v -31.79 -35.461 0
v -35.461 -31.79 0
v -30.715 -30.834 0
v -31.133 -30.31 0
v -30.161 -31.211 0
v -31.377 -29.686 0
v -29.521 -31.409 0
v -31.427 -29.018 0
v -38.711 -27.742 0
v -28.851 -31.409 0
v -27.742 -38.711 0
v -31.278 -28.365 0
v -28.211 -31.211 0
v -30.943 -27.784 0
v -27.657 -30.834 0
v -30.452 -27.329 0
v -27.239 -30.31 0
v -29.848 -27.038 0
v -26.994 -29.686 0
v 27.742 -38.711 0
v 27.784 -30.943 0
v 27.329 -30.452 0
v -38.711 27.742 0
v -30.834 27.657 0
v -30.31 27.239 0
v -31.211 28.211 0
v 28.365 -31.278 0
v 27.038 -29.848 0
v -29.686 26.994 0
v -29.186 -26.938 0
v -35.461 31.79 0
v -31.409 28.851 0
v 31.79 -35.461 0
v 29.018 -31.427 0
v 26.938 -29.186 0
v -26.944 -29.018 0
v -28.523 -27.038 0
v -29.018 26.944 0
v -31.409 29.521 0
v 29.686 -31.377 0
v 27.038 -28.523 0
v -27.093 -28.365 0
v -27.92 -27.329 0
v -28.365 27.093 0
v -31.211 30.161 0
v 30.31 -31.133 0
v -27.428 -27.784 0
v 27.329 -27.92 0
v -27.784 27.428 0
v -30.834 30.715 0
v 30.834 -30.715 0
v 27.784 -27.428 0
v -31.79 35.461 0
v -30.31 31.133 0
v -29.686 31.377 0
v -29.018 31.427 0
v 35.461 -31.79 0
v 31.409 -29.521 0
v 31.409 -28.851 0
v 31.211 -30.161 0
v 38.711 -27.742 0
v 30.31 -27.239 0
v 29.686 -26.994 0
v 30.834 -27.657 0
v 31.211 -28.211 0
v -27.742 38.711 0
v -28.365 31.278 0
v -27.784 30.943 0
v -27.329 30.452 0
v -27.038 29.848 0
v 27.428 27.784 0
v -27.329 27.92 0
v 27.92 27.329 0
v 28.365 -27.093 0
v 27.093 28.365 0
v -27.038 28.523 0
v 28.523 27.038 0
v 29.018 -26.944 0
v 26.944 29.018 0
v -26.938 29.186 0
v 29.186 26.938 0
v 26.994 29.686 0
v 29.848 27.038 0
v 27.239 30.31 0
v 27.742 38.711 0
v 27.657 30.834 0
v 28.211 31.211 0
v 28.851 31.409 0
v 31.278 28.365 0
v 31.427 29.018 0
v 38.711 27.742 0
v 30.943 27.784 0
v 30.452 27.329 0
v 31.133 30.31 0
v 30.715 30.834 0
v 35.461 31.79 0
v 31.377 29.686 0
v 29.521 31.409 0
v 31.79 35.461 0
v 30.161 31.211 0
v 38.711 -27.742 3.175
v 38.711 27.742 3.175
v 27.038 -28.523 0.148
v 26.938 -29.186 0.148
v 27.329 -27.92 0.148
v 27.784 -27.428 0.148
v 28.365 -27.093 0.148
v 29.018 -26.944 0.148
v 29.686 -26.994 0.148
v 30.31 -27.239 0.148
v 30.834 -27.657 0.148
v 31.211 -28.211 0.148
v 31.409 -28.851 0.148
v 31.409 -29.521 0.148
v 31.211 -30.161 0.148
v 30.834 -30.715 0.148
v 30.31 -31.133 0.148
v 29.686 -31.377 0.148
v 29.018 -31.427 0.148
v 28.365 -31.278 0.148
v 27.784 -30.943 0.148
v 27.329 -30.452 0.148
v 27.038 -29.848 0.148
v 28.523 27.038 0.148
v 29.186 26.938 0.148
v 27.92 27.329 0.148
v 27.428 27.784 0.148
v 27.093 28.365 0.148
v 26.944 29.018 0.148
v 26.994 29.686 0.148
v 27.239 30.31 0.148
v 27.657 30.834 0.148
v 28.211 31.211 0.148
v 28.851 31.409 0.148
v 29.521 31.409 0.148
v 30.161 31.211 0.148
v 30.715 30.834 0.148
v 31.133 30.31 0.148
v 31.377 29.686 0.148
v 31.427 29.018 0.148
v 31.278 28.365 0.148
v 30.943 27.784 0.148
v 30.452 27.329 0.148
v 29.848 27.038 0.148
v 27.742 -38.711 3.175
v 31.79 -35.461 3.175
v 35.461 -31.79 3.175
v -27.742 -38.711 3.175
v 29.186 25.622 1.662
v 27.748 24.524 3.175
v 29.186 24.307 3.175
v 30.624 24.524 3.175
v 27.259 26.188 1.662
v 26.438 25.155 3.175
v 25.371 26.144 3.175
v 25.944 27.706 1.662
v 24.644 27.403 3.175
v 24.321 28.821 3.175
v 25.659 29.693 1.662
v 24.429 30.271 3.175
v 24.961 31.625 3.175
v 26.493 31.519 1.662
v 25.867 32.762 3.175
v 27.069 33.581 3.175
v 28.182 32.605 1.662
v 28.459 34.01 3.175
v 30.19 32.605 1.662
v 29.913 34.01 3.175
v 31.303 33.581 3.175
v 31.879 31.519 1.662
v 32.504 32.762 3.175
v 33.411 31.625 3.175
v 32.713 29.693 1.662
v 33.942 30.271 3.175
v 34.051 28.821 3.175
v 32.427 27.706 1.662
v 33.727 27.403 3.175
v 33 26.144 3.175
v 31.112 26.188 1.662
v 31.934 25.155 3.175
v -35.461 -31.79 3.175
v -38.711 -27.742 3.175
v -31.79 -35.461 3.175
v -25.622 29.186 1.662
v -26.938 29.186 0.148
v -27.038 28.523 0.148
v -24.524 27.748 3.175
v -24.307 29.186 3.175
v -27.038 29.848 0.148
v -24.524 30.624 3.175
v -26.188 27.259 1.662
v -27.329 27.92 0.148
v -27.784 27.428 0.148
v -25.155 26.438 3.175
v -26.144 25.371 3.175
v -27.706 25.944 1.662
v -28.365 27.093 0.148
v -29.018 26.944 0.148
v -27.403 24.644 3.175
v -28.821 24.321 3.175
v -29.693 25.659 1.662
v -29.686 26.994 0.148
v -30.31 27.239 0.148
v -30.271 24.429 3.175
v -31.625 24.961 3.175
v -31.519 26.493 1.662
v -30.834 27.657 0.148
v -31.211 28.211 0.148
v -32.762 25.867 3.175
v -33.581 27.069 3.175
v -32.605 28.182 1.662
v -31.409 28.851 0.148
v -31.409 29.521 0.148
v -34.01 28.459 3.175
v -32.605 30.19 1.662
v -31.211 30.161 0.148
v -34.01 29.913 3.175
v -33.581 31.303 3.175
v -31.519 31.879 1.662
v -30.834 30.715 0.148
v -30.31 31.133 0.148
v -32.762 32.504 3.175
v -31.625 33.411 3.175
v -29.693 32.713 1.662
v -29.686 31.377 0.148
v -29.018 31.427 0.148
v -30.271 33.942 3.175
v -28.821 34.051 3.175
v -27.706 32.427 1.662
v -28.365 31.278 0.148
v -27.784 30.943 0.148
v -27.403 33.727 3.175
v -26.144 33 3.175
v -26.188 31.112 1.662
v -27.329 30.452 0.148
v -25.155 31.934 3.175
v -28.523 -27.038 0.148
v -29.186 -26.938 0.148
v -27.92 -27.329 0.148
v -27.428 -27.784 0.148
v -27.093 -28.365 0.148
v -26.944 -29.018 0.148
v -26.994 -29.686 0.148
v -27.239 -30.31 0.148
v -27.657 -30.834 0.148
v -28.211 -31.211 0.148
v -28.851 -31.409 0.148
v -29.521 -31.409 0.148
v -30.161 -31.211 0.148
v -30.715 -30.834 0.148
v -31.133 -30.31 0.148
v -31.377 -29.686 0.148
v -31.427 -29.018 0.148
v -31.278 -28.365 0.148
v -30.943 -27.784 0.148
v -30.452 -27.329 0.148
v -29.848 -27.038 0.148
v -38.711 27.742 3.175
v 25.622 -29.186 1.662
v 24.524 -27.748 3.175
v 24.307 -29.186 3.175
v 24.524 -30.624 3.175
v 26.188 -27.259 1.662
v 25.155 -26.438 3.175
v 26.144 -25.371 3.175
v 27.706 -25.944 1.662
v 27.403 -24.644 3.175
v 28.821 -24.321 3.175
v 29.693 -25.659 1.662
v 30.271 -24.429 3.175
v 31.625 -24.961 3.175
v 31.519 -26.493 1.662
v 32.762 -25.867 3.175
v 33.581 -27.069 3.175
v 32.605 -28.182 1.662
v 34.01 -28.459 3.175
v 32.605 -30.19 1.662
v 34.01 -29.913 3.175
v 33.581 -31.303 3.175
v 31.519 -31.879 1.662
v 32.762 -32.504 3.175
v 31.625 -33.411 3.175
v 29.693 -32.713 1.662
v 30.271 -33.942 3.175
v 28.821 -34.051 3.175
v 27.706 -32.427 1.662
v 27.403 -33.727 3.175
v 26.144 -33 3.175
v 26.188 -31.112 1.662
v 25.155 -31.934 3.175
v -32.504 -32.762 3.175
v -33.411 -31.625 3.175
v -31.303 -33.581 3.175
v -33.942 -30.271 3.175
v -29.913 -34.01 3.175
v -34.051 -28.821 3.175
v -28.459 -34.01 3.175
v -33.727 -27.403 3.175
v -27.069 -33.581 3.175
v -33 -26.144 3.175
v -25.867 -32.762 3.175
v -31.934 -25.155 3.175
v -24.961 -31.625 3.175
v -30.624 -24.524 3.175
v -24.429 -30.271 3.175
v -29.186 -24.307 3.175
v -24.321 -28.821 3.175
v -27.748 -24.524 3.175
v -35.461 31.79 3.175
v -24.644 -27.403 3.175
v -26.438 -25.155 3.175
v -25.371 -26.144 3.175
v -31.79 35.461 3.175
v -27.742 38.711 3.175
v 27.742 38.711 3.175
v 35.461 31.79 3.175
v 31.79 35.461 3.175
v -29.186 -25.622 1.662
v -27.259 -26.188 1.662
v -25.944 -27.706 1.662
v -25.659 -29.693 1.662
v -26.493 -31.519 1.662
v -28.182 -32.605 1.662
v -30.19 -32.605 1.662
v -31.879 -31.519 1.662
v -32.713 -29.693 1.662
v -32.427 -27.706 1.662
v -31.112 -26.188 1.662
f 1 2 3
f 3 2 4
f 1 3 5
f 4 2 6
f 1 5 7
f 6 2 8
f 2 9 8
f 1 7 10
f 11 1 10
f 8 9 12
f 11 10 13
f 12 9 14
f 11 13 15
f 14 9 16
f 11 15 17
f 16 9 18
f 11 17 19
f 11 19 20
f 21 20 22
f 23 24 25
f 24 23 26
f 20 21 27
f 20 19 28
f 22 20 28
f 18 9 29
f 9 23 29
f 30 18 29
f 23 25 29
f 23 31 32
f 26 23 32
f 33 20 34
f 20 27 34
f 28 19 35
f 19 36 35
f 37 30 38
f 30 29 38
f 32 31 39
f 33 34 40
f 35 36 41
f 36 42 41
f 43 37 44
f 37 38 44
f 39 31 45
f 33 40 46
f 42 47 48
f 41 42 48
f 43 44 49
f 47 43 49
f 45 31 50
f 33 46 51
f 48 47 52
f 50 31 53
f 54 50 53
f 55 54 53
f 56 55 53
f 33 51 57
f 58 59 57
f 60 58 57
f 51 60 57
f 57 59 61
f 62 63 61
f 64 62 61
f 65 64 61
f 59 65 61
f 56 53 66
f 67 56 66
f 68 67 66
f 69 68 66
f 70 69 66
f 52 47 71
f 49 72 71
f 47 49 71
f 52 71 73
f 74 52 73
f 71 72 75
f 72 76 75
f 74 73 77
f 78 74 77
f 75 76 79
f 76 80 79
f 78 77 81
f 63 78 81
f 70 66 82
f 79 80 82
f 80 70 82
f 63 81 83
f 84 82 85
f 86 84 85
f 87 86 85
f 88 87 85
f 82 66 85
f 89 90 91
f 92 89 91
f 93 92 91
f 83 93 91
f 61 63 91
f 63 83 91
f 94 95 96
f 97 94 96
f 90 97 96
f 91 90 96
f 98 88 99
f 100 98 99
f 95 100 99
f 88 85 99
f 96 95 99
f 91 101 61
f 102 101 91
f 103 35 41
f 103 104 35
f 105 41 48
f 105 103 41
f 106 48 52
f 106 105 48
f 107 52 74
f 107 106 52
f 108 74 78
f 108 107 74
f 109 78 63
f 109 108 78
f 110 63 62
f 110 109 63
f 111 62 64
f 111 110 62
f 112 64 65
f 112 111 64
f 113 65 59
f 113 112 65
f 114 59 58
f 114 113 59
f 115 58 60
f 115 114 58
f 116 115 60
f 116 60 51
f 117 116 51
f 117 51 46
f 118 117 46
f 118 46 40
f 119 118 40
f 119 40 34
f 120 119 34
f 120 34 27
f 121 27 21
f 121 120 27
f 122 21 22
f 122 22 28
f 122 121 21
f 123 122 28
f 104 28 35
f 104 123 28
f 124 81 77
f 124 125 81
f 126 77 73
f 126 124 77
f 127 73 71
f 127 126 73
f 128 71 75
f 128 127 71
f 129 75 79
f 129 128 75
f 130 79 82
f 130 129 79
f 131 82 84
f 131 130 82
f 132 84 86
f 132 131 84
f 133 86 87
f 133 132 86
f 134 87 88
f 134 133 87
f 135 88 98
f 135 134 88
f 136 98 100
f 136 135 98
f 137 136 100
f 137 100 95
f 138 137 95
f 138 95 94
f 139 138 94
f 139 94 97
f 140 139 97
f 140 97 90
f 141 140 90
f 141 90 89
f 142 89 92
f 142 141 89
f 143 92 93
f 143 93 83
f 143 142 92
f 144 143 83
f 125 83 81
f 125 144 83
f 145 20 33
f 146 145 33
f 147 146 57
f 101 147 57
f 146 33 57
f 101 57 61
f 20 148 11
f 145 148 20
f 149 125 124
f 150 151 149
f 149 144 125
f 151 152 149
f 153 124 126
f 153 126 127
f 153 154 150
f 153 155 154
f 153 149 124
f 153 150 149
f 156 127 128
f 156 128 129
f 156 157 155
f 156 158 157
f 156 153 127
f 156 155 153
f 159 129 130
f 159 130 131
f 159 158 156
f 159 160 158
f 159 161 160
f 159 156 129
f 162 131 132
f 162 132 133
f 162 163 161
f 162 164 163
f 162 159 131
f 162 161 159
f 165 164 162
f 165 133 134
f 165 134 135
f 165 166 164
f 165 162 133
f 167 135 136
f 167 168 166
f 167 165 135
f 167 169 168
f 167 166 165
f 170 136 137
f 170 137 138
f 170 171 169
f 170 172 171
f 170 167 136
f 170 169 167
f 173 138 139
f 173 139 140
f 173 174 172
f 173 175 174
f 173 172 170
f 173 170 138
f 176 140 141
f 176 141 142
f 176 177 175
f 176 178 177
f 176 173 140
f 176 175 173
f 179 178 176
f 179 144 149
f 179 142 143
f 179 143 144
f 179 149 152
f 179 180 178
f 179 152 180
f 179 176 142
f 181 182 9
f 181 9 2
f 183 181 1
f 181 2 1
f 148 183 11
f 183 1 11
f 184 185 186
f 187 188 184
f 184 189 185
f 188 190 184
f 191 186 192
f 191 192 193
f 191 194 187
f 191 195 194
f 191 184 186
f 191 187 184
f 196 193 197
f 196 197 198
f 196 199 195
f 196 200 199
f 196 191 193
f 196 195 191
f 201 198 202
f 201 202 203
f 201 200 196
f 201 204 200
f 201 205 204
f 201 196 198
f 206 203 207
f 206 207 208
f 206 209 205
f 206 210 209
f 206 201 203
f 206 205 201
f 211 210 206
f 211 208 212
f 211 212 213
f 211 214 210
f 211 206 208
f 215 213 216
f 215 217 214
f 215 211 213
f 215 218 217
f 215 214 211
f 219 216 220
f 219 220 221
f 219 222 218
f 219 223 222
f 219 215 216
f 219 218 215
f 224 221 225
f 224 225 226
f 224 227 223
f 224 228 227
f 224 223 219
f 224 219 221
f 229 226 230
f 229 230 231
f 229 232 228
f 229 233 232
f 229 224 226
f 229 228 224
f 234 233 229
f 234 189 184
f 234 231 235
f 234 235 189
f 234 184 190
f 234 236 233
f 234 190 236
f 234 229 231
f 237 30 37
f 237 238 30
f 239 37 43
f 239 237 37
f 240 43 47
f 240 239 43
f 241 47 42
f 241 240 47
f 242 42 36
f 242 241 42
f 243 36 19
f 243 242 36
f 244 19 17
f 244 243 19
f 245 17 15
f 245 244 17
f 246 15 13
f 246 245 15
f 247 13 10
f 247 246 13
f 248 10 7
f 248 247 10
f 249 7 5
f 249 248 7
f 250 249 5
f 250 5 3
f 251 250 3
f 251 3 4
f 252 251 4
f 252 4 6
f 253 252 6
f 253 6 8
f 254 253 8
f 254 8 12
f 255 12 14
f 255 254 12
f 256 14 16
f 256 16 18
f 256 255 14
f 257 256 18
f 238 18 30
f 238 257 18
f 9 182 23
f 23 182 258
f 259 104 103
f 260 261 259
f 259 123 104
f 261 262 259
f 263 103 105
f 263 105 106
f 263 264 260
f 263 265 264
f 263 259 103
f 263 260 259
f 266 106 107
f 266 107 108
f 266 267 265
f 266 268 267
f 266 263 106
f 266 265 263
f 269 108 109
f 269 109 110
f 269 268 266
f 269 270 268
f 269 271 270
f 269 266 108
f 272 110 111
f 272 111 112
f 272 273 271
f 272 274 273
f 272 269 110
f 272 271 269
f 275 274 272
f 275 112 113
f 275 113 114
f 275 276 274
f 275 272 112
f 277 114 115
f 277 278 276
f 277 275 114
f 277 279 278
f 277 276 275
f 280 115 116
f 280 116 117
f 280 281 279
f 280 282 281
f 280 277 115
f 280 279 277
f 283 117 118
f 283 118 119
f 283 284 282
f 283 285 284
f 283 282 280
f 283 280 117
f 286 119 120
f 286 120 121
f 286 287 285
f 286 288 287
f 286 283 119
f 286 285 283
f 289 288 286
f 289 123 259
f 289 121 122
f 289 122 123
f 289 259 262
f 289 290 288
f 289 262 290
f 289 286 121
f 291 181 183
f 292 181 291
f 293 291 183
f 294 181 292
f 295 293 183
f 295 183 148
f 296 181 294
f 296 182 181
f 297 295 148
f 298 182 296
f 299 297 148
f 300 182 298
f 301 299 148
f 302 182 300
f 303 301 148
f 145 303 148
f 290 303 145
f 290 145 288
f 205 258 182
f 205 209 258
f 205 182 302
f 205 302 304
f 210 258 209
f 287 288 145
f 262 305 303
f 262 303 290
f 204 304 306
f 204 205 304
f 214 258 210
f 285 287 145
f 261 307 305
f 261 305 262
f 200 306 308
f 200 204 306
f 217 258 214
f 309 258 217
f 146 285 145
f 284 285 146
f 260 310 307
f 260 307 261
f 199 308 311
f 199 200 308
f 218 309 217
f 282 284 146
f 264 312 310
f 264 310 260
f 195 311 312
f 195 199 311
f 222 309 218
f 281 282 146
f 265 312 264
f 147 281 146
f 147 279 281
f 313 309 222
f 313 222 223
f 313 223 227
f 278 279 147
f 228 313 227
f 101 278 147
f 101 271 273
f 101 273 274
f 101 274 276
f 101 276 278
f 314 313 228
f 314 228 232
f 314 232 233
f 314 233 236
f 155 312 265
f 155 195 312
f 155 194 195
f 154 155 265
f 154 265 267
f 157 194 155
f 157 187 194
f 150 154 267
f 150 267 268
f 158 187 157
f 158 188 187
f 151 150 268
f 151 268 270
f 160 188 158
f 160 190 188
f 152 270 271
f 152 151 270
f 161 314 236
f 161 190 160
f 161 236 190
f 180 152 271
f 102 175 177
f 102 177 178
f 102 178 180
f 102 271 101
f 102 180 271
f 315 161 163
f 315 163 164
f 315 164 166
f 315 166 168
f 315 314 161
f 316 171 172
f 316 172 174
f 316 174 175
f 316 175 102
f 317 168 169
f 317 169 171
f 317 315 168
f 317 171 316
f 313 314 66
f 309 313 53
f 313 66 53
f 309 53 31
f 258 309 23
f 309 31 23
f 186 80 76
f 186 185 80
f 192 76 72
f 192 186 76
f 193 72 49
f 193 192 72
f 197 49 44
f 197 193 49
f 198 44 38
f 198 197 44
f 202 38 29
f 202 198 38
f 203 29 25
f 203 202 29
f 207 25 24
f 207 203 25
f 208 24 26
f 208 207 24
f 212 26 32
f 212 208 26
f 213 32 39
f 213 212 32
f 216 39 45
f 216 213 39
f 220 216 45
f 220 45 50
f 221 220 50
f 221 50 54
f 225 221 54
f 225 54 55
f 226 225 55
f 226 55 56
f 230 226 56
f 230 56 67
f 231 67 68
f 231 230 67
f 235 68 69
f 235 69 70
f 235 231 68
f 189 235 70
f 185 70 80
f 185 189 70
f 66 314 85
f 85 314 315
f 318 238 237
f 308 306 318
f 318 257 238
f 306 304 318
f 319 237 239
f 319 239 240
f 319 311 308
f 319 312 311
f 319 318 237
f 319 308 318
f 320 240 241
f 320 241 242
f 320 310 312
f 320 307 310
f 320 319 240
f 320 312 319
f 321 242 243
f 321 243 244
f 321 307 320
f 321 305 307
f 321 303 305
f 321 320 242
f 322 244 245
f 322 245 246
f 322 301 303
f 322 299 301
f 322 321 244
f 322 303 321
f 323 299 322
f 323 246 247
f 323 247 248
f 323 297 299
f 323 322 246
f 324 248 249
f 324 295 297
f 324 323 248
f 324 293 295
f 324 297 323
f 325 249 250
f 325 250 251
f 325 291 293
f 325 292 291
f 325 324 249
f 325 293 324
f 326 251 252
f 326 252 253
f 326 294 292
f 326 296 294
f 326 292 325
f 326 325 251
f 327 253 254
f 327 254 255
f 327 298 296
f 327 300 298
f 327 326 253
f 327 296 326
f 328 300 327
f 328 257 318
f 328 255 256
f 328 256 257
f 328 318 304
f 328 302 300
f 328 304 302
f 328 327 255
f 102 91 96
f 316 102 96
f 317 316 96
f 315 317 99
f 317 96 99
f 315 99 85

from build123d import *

# Parameters (mm, degrees)
SKETCH1_R           = 47.625
BOSS_EXTRUDE1_DEPTH = 3.175
CIRPATTERN1_COUNT   = 4
SKETCH6_OUTSIDE_W   = 124.198
SKETCH6_OUTSIDE_H   = 124.198
SKETCH6_OUTSIDE_W_2 = 77.421664786
SKETCH6_OUTSIDE_H_2 = 77.421664786
CUT_EXTRUDE2_DEPTH  = 68.426714847


with BuildPart() as part:
    # Sketch1 → Boss-Extrude1 (new body)
    with BuildSketch(Plane.XY):
        Circle(SKETCH1_R)
    extrude(amount=BOSS_EXTRUDE1_DEPTH)

    # Sketch3 → CSK for #8 Flat Head Machine Screw1 (revolve, cut)
    with BuildSketch(Plane(origin=(29.185832393, 29.185832393, 3.175), x_dir=(0, -1, 0), z_dir=(1, 0, 0))):
        Polygon((0, 0), (0, 3.175), (2.2479, 3.175), (2.2479, 3.026511835), (4.8788066, 0), align=None)
    csk_for_8_flat_head_machine_screw1 = revolve(axis=Axis((29.185832393, 29.185832393, 9.525), (0, 0, -1)), mode=Mode.SUBTRACT)

    # CirPattern1: CSK for #8 Flat Head Machine Screw1 ×4 about axis
    cirpattern1_axis = Axis((0, 0, 0), (0, 0, 1))
    for i in range(1, CIRPATTERN1_COUNT):
        add(csk_for_8_flat_head_machine_screw1.rotate(cirpattern1_axis, i * 360 / CIRPATTERN1_COUNT), mode=Mode.SUBTRACT)

    # Sketch6 outside → Cut-Extrude2 (cut, through all)
    with BuildSketch(Plane.XY.offset(3.175)):
        Rectangle(SKETCH6_OUTSIDE_W, SKETCH6_OUTSIDE_H)
        Rectangle(SKETCH6_OUTSIDE_W_2, SKETCH6_OUTSIDE_H_2, mode=Mode.SUBTRACT)
    extrude(amount=-CUT_EXTRUDE2_DEPTH, mode=Mode.SUBTRACT)


solid = part.part
